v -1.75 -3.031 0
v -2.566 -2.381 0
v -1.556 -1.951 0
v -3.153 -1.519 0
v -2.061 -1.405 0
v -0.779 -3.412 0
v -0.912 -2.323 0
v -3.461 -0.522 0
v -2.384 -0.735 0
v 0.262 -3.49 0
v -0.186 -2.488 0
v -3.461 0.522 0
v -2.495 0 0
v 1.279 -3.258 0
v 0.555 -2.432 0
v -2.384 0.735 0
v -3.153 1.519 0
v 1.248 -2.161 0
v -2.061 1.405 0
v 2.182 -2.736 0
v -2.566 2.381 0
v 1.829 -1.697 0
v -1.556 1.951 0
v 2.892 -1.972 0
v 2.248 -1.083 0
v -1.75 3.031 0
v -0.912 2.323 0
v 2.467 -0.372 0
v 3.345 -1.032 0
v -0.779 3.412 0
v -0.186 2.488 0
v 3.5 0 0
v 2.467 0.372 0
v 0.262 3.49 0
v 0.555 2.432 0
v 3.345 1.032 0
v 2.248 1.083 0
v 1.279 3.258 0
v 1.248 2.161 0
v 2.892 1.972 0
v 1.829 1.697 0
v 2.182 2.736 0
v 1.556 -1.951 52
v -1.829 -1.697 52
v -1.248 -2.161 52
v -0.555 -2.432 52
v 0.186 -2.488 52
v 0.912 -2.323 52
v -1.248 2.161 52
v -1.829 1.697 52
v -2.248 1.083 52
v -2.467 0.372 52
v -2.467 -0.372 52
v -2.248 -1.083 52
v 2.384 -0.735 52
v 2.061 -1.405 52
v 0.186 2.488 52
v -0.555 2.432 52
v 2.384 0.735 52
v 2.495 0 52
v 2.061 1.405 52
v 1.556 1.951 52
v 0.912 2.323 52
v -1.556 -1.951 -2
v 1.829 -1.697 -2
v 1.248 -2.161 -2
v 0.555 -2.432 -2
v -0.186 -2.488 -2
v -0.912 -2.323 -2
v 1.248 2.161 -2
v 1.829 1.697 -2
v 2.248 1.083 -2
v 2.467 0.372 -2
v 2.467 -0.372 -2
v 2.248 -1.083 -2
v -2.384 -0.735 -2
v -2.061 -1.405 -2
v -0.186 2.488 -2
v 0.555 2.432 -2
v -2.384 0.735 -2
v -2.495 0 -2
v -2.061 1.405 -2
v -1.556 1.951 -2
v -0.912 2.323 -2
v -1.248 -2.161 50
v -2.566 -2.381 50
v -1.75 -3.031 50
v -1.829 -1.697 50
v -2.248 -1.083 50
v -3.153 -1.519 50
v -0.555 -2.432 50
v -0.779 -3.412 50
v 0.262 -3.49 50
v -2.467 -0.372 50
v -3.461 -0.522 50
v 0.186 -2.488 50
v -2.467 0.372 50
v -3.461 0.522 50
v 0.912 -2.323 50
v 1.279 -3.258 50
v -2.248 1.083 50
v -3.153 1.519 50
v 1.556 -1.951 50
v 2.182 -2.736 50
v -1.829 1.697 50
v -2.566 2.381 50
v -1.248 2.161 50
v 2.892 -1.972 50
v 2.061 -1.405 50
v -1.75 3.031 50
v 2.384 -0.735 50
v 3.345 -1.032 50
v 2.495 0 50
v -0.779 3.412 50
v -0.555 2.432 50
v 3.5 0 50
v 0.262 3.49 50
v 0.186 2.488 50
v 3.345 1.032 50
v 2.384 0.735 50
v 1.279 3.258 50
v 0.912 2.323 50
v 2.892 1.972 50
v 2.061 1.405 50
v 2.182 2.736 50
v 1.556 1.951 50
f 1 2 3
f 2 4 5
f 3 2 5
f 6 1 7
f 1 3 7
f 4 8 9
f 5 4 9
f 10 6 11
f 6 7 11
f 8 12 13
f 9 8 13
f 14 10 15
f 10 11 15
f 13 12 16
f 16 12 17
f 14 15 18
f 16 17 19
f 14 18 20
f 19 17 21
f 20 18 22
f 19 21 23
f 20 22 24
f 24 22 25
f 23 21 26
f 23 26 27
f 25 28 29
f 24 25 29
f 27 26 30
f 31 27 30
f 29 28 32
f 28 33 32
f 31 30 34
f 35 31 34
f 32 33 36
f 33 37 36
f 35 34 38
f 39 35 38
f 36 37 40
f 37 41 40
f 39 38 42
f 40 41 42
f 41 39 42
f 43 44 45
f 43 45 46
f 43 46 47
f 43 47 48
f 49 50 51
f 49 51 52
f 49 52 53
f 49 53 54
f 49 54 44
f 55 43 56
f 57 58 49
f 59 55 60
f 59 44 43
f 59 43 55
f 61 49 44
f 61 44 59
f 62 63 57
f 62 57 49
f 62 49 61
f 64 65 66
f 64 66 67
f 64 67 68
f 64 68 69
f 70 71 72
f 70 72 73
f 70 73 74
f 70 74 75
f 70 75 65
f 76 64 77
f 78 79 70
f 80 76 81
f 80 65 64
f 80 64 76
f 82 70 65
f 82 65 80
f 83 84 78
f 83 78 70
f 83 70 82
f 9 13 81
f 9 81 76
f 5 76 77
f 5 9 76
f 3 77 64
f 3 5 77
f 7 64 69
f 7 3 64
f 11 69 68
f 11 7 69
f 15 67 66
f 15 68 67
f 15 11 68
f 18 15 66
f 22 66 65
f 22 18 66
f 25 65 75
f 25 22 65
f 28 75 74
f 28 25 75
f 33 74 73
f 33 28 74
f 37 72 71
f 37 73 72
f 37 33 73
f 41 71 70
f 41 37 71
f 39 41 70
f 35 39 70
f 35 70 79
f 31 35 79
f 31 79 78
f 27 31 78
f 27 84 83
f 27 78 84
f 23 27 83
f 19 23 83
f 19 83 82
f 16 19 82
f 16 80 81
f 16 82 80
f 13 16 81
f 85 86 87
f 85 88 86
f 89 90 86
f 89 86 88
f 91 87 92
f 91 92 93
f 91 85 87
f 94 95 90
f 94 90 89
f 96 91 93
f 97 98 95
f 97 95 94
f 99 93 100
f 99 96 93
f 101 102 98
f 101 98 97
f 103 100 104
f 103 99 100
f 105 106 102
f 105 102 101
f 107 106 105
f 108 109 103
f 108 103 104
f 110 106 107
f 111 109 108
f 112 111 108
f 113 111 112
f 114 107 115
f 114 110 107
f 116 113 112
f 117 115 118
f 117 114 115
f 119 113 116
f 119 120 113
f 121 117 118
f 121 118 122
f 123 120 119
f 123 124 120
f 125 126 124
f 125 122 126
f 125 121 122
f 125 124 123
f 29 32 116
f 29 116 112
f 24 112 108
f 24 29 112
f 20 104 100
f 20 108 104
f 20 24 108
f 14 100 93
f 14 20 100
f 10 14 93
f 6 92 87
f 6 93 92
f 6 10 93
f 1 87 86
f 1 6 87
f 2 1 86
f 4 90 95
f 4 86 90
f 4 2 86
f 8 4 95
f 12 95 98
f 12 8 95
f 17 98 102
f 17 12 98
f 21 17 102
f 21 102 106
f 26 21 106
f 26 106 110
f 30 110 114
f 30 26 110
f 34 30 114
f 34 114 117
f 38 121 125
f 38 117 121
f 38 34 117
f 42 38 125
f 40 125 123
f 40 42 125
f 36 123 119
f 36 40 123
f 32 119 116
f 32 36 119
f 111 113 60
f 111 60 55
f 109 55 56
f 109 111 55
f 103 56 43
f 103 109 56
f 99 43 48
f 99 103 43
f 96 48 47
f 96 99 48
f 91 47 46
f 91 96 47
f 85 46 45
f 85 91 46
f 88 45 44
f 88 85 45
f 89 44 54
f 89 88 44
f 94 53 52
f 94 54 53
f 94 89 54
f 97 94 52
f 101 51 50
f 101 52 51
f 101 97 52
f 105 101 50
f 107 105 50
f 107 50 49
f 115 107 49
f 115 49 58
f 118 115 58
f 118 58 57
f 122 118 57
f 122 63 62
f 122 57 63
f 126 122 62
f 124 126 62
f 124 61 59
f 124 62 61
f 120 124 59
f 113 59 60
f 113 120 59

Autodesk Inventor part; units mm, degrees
ref_plane "YZ Plane" through (0, 0, 0) normal (1, 0, 0) x (0, 1, 0)
ref_plane "XZ Plane" through (0, 0, 0) normal (0, 1, 0) x (-1, 0, 0)
ref_plane "XY Plane" through (0, 0, 0) normal (0, 0, 1) x (1, 0, 0)
sketch "Sketch1" plane through (0, 0, 0) normal (0, 0, 1) x (1, 0, 0)
  circle A0 centre (0, 0) radius 3.5
  dimension "d0" = 7
extrude "Extrusion1" add sketch "Sketch1" along normal blind 50
sketch "Sketch2" plane through (0, 0, 50) normal (0, 0, 1) x (1, 0, 0)
  circle A0 centre (0, 0) radius 3.5 projected
  circle A1 centre (0, 0) radius 2.495
  dimension "d3" = 4.99
extrude "Extrusion2" add sketch "Sketch2" along normal blind 2 contours A1
sketch "Sketch3" plane through (0, 0, 0) normal (0, 0, -1) x (-1, 0, 0)
  circle A0 centre (0, 0) radius 3.5 projected
  circle A1 centre (0, 0) radius 2.495
extrude "Extrusion3" add sketch "Sketch3" along normal blind 2 contours A1
properties part number "Steunpaal"
